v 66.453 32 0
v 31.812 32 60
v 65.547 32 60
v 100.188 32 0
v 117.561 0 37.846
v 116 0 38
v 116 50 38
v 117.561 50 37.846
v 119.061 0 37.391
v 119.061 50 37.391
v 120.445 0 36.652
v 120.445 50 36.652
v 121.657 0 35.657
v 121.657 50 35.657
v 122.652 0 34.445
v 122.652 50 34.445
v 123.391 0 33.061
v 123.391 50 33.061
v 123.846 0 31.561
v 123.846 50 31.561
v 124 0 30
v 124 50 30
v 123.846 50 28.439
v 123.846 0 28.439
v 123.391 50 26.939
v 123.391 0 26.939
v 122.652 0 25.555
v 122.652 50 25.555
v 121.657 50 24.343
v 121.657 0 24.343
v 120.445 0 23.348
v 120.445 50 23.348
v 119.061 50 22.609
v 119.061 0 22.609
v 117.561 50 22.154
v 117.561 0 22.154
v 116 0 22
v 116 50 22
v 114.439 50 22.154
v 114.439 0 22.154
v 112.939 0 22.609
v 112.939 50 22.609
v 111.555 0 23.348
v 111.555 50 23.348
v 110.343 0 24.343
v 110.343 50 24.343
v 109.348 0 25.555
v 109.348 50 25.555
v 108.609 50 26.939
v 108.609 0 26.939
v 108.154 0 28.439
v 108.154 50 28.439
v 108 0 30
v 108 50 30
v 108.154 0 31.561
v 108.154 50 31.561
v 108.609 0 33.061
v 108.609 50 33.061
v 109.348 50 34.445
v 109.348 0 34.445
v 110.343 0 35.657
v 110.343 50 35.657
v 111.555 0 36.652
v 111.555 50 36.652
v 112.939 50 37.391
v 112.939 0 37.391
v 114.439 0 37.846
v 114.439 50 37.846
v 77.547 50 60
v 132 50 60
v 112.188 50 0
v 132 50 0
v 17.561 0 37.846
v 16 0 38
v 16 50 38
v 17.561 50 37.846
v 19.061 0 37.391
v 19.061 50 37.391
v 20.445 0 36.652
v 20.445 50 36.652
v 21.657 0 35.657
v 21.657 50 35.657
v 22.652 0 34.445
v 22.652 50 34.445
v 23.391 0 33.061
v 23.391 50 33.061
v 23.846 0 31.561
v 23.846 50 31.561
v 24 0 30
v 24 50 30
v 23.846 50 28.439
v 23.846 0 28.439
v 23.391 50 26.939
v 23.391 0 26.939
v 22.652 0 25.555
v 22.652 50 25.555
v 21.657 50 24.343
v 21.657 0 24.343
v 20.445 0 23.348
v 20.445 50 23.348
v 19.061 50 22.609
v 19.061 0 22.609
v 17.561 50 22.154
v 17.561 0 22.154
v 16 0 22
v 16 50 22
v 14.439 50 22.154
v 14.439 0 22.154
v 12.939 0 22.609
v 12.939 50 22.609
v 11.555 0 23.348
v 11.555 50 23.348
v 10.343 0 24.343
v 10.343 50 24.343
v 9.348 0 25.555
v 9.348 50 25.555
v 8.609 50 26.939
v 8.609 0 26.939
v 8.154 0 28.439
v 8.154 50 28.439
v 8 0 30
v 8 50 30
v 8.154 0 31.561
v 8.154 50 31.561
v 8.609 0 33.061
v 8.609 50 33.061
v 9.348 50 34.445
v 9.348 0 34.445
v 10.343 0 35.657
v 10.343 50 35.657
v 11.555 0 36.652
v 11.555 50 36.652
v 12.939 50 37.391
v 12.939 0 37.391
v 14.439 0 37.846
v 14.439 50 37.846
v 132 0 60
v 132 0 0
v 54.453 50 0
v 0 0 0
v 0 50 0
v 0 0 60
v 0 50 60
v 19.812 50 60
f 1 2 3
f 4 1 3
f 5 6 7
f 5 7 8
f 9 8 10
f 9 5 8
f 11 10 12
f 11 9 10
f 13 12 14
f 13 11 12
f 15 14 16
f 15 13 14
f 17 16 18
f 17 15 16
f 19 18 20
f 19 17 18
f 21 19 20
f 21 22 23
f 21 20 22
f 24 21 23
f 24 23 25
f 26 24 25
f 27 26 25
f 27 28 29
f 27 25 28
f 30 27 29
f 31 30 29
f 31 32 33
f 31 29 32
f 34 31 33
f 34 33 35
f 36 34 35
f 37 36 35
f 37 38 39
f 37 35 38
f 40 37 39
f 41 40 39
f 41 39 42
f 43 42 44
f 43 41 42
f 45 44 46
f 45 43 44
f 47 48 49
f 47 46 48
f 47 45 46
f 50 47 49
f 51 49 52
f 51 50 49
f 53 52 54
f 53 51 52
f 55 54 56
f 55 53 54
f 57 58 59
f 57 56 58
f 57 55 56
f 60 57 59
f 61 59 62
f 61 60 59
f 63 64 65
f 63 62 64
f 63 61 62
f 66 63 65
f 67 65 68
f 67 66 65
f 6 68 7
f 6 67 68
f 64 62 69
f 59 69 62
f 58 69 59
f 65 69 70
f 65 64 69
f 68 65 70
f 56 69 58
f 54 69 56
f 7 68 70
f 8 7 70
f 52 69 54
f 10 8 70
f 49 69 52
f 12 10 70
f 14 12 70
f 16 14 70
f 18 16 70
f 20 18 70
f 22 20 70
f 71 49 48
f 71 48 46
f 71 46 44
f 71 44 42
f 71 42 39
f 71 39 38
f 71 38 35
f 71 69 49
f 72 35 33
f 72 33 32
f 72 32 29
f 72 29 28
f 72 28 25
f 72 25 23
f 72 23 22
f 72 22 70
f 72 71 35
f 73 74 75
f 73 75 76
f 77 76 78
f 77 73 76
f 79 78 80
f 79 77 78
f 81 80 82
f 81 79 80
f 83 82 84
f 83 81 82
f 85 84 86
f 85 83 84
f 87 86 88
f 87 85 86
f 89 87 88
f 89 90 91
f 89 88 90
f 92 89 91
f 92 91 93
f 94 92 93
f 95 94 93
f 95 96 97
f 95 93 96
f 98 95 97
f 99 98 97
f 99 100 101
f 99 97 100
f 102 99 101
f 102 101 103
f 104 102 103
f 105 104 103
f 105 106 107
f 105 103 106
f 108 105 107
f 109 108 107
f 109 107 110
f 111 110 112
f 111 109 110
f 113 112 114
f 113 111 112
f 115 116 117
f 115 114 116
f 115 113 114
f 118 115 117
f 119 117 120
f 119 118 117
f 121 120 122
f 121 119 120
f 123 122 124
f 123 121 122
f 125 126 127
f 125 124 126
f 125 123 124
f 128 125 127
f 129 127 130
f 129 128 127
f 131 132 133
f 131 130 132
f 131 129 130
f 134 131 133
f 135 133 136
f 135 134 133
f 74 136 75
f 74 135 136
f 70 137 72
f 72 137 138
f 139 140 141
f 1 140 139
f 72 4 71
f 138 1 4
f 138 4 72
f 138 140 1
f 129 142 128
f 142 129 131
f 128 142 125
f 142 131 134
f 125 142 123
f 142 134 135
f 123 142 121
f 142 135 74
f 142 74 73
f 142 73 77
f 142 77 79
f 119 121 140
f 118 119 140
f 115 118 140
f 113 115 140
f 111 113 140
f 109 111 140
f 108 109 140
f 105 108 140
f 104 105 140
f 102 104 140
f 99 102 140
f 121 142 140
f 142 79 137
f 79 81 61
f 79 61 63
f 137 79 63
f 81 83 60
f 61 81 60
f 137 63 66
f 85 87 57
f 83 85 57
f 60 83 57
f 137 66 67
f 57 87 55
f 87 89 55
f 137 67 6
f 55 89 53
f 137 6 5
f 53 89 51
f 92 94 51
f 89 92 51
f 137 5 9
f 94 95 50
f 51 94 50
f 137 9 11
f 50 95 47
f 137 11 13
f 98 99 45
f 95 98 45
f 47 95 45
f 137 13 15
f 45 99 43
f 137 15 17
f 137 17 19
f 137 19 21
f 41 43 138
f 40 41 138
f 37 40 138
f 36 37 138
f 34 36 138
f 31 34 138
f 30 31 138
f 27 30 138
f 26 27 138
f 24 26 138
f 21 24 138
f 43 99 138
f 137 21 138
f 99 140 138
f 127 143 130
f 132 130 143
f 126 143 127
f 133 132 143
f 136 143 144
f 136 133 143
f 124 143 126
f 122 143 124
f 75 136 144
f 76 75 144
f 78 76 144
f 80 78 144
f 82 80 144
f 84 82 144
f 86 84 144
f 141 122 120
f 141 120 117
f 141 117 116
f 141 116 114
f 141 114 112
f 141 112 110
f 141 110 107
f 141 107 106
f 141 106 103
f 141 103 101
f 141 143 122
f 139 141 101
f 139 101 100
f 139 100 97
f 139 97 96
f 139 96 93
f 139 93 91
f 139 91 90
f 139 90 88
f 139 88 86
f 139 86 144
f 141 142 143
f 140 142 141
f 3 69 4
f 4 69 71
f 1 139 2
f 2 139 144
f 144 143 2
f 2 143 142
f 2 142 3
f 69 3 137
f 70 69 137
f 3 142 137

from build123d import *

# Parameters (mm, degrees)
SKETCH_1_W               = 132
SKETCH_1_H               = 60
EXTRUDE_1_DEPTH          = 50
CUT_EXTRUDE_1_DEPTH      = 154.37535656
CUT_EXTRUDE_1_DEPTH_BACK = 154.37535656
SKETCH_2_R               = 8
CUT_EXTRUDE_1_2_DEPTH    = 18
CUT_EXTRUDE_1_2_DRAFT    = -30


with BuildPart() as part:
    # 草图1 → 凸台-拉伸1 (new body)
    with BuildSketch(Plane(origin=(0, 0, 0), x_dir=(1, 0, 0), z_dir=(0, 1, 0))):
        with Locations((66, -30)):
            Rectangle(SKETCH_1_W, SKETCH_1_H)
    extrude(amount=EXTRUDE_1_DEPTH)

    # 草图2 → Cut-Extrude 1 (cut, two sides: drawn at the far end of the back side and taken through both)
    with BuildSketch(Plane(origin=(0, 50, 0), x_dir=(1, 0, 0), z_dir=(0, 1, 0)).offset(-CUT_EXTRUDE_1_DEPTH_BACK)):
        with Locations(Location((16, -30, 0), (0, 0, 270))):
            Circle(SKETCH_2_R)
        with Locations(Location((116, -30, 0), (0, 0, 270))):
            Circle(SKETCH_2_R)
    extrude(amount=CUT_EXTRUDE_1_DEPTH + CUT_EXTRUDE_1_DEPTH_BACK, mode=Mode.SUBTRACT)


with BuildPart() as cut_extrude_1_2_tool:
    # 草图4 → Cut-Extrude 1 2 (with draft: the straight prism first)
    with BuildSketch(Plane(origin=(0, 50, 0), x_dir=(1, 0, 0), z_dir=(0, 1, 0))):
        Polygon((76.145931536, 37.57326891), (9.744604929, -77.437202462), (53.045875119, -102.437202462), (119.447201725, 12.57326891), align=None)
    extrude(amount=-CUT_EXTRUDE_1_2_DEPTH)
    # Cut-Extrude 1 2: the draft: its side faces are tilted about the plane it starts from
    cut_extrude_1_2_sides = [cut_extrude_1_2_tool.faces().sort_by_distance(p)[0] for p in [
        (42.945268233, 41, 19.931966776),
        (31.395240024, 41, 89.937202462),
        (86.246538422, 41, 44.931966776),
        (97.79656663, 41, -25.07326891),
    ]]
    draft(cut_extrude_1_2_sides, Plane(origin=(0, 50, 0), x_dir=(1, 0, 0), z_dir=(0, 1, 0)), CUT_EXTRUDE_1_2_DRAFT)


with BuildPart() as part_1:
    add(part.part)

    # Cut-Extrude 1 2: cut by cut_extrude_1_2_tool
    add(cut_extrude_1_2_tool.part, mode=Mode.SUBTRACT)


solid = part_1.part
